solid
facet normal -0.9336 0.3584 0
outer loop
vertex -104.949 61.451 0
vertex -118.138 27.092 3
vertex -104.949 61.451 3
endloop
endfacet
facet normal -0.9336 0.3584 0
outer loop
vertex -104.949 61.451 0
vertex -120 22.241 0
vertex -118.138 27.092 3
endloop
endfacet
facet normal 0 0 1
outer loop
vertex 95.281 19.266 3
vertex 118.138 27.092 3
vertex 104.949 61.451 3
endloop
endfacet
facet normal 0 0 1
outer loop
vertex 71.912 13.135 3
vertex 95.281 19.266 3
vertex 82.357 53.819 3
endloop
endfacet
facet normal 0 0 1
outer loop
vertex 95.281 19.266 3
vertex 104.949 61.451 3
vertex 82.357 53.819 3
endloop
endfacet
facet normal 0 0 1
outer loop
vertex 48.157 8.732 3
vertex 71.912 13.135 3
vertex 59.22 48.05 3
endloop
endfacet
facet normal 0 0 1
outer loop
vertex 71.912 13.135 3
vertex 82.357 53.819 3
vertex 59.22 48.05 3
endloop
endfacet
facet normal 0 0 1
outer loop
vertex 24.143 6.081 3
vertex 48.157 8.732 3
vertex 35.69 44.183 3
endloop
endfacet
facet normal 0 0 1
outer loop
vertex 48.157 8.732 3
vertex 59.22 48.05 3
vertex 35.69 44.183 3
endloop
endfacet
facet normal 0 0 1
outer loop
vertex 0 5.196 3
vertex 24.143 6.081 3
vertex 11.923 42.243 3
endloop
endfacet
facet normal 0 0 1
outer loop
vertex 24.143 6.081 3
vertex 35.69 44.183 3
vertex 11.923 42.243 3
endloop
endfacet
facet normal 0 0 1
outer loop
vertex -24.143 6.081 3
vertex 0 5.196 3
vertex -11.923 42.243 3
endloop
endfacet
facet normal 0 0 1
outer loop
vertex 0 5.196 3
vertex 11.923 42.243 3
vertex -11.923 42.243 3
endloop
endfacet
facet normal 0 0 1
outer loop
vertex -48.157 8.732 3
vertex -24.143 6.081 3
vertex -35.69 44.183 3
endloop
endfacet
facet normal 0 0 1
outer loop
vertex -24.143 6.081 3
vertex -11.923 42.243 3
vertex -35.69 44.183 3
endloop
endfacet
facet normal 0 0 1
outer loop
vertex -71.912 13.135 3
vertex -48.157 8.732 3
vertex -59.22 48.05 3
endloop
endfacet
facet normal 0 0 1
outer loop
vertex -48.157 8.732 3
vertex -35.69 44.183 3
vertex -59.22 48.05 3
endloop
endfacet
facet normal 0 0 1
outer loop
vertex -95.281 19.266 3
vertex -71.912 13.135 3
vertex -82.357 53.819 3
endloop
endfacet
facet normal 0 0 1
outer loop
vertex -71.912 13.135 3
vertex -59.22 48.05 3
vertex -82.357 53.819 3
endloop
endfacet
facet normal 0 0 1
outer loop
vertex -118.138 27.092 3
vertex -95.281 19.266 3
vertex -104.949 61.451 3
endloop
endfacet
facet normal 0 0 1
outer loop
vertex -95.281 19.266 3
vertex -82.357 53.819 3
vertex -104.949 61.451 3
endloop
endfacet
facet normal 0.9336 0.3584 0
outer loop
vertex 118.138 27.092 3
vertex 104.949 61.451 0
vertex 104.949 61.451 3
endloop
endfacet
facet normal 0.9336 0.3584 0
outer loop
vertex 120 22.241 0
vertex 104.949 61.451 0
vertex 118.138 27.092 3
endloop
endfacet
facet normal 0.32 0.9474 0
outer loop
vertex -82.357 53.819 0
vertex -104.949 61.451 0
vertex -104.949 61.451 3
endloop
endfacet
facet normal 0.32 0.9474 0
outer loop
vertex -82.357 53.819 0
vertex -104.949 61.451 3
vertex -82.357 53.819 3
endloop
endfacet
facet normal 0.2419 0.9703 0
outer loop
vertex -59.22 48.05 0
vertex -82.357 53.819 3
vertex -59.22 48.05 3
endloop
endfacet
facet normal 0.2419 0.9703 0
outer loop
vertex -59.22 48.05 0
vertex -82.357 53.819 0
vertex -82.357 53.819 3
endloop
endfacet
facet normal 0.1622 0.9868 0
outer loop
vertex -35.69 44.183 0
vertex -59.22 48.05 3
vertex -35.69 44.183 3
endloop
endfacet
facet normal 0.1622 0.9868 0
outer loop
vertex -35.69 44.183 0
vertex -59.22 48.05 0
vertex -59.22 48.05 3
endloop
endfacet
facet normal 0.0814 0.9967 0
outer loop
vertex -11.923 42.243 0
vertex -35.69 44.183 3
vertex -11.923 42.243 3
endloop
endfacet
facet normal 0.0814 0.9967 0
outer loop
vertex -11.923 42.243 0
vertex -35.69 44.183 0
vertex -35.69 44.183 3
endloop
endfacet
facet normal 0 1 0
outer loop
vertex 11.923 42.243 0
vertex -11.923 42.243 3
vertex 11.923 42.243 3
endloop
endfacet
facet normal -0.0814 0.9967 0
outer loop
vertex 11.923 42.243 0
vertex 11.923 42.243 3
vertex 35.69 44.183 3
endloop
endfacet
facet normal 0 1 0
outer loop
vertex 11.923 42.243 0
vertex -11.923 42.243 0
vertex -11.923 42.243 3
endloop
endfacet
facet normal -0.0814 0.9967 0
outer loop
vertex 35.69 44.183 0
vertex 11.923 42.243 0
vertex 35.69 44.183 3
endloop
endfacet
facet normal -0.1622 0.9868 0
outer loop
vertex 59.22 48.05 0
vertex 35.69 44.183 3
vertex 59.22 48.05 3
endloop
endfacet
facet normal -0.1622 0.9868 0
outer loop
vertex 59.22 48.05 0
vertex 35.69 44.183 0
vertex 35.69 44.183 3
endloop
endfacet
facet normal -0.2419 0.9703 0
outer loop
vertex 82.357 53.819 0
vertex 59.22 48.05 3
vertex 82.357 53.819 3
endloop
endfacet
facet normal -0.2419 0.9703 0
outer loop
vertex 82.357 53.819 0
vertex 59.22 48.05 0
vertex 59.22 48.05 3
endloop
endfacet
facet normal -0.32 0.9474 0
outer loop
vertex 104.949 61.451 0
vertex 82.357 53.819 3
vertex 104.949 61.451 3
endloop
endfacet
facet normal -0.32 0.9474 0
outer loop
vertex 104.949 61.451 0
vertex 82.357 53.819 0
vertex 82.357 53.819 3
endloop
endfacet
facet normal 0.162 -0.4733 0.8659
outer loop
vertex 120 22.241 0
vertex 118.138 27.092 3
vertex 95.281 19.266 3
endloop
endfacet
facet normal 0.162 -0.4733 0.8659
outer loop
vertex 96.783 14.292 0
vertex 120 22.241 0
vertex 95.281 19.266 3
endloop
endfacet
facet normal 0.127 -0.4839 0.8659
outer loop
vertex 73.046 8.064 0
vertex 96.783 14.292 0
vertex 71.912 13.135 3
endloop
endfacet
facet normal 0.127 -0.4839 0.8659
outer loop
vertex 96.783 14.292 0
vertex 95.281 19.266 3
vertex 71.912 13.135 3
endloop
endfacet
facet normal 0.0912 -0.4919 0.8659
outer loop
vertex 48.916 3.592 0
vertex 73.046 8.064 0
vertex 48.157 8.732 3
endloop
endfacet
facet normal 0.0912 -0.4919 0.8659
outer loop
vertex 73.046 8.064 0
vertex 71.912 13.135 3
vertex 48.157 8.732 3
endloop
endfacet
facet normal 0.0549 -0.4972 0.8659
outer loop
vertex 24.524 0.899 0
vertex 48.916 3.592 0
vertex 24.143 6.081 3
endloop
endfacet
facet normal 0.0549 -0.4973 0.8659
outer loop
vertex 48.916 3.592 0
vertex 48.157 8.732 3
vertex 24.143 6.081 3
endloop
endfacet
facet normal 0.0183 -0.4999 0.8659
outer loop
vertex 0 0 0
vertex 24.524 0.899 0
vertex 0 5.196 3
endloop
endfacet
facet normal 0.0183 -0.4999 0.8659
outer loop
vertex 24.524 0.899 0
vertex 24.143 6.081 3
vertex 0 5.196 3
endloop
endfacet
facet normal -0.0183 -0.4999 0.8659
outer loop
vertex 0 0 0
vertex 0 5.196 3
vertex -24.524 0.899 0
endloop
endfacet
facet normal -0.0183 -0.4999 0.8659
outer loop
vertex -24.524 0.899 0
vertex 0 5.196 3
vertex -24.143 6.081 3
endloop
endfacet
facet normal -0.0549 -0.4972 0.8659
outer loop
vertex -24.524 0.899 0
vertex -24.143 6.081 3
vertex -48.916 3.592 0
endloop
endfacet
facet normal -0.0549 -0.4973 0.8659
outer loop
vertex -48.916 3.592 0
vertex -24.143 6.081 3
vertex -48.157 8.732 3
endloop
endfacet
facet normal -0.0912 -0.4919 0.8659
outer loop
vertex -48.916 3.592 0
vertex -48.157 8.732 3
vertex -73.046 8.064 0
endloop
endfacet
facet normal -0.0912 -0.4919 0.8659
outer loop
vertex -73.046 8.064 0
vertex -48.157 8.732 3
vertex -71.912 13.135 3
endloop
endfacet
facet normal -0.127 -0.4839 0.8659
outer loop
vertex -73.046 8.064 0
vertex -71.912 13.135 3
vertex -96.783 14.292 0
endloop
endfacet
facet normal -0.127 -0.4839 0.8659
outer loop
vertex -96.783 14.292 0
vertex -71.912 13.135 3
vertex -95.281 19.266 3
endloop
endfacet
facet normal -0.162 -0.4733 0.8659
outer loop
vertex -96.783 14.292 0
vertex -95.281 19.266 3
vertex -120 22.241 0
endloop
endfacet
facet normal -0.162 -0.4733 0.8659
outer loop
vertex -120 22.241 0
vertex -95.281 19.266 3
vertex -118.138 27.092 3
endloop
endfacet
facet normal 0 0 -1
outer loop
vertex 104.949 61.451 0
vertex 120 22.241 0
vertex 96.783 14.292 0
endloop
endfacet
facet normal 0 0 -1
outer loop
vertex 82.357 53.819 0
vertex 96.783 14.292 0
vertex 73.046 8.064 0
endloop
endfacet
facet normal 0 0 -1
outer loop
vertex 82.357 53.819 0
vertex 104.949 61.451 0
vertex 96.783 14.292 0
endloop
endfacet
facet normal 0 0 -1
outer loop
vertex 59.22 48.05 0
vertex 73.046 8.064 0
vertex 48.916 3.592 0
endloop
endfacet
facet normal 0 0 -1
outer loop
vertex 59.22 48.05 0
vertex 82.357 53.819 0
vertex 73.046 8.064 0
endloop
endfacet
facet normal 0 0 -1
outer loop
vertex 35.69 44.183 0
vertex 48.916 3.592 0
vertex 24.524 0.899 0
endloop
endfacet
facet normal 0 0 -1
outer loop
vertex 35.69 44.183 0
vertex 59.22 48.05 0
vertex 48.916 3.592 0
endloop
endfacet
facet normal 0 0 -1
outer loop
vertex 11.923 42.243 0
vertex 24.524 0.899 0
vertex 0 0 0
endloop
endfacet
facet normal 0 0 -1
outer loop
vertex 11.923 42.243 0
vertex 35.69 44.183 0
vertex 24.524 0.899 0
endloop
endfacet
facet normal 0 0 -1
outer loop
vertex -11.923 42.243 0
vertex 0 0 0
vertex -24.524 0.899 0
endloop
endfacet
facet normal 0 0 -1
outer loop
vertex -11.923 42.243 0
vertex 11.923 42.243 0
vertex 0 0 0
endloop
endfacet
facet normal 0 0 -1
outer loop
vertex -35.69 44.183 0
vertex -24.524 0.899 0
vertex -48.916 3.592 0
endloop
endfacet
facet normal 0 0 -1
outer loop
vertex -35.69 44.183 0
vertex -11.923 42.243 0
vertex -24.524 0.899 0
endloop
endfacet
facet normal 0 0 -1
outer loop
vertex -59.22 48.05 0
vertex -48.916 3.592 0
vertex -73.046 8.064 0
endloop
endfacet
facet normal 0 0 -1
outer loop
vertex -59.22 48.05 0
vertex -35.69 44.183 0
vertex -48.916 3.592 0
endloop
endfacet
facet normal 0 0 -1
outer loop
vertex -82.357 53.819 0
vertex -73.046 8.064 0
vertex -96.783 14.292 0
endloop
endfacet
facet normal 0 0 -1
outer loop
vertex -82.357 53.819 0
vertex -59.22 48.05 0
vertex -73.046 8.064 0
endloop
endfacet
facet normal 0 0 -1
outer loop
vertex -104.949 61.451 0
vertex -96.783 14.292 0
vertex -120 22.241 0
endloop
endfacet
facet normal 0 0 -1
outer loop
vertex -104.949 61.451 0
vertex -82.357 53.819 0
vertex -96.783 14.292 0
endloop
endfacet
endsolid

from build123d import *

# Parameters (mm, degrees)
BOSS_EXTRU_1_DEPTH = 3
CHANFREIN1_SIZE2   = 5.196152423
CHANFREIN1_SIZE    = 3


with BuildPart() as part:
    # Esquisse1 → Boss.-Extru.1 (new body)
    with BuildSketch(Plane.XY):
        with BuildLine():
            Line((-120, 22.240685392), (-104.948546119, 61.451063305))
            ThreePointArc((-104.948546119, 61.451063305), (0, 42), (104.948546119, 61.451063305))
            Line((104.948546119, 61.451063305), (120, 22.240685392))
            ThreePointArc((120, 22.240685392), (0, 0), (-120, 22.240685392))
        make_face()
    extrude(amount=BOSS_EXTRU_1_DEPTH)

    # Chanfrein1
    chanfrein1_edges = [part.edges().sort_by_distance(p)[0] for p in [
        (0, 0, 3),
    ]]
    chanfrein1_side = [part.faces().sort_by_distance(p)[0] for p in [
        (0, 0, 2.94),
    ]]
    chamfer(chanfrein1_edges, length=CHANFREIN1_SIZE - 0.0001, length2=CHANFREIN1_SIZE2 - 0.0001, reference=chanfrein1_side[0])  # a hair under: the kernel refuses the full size


solid = part.part
